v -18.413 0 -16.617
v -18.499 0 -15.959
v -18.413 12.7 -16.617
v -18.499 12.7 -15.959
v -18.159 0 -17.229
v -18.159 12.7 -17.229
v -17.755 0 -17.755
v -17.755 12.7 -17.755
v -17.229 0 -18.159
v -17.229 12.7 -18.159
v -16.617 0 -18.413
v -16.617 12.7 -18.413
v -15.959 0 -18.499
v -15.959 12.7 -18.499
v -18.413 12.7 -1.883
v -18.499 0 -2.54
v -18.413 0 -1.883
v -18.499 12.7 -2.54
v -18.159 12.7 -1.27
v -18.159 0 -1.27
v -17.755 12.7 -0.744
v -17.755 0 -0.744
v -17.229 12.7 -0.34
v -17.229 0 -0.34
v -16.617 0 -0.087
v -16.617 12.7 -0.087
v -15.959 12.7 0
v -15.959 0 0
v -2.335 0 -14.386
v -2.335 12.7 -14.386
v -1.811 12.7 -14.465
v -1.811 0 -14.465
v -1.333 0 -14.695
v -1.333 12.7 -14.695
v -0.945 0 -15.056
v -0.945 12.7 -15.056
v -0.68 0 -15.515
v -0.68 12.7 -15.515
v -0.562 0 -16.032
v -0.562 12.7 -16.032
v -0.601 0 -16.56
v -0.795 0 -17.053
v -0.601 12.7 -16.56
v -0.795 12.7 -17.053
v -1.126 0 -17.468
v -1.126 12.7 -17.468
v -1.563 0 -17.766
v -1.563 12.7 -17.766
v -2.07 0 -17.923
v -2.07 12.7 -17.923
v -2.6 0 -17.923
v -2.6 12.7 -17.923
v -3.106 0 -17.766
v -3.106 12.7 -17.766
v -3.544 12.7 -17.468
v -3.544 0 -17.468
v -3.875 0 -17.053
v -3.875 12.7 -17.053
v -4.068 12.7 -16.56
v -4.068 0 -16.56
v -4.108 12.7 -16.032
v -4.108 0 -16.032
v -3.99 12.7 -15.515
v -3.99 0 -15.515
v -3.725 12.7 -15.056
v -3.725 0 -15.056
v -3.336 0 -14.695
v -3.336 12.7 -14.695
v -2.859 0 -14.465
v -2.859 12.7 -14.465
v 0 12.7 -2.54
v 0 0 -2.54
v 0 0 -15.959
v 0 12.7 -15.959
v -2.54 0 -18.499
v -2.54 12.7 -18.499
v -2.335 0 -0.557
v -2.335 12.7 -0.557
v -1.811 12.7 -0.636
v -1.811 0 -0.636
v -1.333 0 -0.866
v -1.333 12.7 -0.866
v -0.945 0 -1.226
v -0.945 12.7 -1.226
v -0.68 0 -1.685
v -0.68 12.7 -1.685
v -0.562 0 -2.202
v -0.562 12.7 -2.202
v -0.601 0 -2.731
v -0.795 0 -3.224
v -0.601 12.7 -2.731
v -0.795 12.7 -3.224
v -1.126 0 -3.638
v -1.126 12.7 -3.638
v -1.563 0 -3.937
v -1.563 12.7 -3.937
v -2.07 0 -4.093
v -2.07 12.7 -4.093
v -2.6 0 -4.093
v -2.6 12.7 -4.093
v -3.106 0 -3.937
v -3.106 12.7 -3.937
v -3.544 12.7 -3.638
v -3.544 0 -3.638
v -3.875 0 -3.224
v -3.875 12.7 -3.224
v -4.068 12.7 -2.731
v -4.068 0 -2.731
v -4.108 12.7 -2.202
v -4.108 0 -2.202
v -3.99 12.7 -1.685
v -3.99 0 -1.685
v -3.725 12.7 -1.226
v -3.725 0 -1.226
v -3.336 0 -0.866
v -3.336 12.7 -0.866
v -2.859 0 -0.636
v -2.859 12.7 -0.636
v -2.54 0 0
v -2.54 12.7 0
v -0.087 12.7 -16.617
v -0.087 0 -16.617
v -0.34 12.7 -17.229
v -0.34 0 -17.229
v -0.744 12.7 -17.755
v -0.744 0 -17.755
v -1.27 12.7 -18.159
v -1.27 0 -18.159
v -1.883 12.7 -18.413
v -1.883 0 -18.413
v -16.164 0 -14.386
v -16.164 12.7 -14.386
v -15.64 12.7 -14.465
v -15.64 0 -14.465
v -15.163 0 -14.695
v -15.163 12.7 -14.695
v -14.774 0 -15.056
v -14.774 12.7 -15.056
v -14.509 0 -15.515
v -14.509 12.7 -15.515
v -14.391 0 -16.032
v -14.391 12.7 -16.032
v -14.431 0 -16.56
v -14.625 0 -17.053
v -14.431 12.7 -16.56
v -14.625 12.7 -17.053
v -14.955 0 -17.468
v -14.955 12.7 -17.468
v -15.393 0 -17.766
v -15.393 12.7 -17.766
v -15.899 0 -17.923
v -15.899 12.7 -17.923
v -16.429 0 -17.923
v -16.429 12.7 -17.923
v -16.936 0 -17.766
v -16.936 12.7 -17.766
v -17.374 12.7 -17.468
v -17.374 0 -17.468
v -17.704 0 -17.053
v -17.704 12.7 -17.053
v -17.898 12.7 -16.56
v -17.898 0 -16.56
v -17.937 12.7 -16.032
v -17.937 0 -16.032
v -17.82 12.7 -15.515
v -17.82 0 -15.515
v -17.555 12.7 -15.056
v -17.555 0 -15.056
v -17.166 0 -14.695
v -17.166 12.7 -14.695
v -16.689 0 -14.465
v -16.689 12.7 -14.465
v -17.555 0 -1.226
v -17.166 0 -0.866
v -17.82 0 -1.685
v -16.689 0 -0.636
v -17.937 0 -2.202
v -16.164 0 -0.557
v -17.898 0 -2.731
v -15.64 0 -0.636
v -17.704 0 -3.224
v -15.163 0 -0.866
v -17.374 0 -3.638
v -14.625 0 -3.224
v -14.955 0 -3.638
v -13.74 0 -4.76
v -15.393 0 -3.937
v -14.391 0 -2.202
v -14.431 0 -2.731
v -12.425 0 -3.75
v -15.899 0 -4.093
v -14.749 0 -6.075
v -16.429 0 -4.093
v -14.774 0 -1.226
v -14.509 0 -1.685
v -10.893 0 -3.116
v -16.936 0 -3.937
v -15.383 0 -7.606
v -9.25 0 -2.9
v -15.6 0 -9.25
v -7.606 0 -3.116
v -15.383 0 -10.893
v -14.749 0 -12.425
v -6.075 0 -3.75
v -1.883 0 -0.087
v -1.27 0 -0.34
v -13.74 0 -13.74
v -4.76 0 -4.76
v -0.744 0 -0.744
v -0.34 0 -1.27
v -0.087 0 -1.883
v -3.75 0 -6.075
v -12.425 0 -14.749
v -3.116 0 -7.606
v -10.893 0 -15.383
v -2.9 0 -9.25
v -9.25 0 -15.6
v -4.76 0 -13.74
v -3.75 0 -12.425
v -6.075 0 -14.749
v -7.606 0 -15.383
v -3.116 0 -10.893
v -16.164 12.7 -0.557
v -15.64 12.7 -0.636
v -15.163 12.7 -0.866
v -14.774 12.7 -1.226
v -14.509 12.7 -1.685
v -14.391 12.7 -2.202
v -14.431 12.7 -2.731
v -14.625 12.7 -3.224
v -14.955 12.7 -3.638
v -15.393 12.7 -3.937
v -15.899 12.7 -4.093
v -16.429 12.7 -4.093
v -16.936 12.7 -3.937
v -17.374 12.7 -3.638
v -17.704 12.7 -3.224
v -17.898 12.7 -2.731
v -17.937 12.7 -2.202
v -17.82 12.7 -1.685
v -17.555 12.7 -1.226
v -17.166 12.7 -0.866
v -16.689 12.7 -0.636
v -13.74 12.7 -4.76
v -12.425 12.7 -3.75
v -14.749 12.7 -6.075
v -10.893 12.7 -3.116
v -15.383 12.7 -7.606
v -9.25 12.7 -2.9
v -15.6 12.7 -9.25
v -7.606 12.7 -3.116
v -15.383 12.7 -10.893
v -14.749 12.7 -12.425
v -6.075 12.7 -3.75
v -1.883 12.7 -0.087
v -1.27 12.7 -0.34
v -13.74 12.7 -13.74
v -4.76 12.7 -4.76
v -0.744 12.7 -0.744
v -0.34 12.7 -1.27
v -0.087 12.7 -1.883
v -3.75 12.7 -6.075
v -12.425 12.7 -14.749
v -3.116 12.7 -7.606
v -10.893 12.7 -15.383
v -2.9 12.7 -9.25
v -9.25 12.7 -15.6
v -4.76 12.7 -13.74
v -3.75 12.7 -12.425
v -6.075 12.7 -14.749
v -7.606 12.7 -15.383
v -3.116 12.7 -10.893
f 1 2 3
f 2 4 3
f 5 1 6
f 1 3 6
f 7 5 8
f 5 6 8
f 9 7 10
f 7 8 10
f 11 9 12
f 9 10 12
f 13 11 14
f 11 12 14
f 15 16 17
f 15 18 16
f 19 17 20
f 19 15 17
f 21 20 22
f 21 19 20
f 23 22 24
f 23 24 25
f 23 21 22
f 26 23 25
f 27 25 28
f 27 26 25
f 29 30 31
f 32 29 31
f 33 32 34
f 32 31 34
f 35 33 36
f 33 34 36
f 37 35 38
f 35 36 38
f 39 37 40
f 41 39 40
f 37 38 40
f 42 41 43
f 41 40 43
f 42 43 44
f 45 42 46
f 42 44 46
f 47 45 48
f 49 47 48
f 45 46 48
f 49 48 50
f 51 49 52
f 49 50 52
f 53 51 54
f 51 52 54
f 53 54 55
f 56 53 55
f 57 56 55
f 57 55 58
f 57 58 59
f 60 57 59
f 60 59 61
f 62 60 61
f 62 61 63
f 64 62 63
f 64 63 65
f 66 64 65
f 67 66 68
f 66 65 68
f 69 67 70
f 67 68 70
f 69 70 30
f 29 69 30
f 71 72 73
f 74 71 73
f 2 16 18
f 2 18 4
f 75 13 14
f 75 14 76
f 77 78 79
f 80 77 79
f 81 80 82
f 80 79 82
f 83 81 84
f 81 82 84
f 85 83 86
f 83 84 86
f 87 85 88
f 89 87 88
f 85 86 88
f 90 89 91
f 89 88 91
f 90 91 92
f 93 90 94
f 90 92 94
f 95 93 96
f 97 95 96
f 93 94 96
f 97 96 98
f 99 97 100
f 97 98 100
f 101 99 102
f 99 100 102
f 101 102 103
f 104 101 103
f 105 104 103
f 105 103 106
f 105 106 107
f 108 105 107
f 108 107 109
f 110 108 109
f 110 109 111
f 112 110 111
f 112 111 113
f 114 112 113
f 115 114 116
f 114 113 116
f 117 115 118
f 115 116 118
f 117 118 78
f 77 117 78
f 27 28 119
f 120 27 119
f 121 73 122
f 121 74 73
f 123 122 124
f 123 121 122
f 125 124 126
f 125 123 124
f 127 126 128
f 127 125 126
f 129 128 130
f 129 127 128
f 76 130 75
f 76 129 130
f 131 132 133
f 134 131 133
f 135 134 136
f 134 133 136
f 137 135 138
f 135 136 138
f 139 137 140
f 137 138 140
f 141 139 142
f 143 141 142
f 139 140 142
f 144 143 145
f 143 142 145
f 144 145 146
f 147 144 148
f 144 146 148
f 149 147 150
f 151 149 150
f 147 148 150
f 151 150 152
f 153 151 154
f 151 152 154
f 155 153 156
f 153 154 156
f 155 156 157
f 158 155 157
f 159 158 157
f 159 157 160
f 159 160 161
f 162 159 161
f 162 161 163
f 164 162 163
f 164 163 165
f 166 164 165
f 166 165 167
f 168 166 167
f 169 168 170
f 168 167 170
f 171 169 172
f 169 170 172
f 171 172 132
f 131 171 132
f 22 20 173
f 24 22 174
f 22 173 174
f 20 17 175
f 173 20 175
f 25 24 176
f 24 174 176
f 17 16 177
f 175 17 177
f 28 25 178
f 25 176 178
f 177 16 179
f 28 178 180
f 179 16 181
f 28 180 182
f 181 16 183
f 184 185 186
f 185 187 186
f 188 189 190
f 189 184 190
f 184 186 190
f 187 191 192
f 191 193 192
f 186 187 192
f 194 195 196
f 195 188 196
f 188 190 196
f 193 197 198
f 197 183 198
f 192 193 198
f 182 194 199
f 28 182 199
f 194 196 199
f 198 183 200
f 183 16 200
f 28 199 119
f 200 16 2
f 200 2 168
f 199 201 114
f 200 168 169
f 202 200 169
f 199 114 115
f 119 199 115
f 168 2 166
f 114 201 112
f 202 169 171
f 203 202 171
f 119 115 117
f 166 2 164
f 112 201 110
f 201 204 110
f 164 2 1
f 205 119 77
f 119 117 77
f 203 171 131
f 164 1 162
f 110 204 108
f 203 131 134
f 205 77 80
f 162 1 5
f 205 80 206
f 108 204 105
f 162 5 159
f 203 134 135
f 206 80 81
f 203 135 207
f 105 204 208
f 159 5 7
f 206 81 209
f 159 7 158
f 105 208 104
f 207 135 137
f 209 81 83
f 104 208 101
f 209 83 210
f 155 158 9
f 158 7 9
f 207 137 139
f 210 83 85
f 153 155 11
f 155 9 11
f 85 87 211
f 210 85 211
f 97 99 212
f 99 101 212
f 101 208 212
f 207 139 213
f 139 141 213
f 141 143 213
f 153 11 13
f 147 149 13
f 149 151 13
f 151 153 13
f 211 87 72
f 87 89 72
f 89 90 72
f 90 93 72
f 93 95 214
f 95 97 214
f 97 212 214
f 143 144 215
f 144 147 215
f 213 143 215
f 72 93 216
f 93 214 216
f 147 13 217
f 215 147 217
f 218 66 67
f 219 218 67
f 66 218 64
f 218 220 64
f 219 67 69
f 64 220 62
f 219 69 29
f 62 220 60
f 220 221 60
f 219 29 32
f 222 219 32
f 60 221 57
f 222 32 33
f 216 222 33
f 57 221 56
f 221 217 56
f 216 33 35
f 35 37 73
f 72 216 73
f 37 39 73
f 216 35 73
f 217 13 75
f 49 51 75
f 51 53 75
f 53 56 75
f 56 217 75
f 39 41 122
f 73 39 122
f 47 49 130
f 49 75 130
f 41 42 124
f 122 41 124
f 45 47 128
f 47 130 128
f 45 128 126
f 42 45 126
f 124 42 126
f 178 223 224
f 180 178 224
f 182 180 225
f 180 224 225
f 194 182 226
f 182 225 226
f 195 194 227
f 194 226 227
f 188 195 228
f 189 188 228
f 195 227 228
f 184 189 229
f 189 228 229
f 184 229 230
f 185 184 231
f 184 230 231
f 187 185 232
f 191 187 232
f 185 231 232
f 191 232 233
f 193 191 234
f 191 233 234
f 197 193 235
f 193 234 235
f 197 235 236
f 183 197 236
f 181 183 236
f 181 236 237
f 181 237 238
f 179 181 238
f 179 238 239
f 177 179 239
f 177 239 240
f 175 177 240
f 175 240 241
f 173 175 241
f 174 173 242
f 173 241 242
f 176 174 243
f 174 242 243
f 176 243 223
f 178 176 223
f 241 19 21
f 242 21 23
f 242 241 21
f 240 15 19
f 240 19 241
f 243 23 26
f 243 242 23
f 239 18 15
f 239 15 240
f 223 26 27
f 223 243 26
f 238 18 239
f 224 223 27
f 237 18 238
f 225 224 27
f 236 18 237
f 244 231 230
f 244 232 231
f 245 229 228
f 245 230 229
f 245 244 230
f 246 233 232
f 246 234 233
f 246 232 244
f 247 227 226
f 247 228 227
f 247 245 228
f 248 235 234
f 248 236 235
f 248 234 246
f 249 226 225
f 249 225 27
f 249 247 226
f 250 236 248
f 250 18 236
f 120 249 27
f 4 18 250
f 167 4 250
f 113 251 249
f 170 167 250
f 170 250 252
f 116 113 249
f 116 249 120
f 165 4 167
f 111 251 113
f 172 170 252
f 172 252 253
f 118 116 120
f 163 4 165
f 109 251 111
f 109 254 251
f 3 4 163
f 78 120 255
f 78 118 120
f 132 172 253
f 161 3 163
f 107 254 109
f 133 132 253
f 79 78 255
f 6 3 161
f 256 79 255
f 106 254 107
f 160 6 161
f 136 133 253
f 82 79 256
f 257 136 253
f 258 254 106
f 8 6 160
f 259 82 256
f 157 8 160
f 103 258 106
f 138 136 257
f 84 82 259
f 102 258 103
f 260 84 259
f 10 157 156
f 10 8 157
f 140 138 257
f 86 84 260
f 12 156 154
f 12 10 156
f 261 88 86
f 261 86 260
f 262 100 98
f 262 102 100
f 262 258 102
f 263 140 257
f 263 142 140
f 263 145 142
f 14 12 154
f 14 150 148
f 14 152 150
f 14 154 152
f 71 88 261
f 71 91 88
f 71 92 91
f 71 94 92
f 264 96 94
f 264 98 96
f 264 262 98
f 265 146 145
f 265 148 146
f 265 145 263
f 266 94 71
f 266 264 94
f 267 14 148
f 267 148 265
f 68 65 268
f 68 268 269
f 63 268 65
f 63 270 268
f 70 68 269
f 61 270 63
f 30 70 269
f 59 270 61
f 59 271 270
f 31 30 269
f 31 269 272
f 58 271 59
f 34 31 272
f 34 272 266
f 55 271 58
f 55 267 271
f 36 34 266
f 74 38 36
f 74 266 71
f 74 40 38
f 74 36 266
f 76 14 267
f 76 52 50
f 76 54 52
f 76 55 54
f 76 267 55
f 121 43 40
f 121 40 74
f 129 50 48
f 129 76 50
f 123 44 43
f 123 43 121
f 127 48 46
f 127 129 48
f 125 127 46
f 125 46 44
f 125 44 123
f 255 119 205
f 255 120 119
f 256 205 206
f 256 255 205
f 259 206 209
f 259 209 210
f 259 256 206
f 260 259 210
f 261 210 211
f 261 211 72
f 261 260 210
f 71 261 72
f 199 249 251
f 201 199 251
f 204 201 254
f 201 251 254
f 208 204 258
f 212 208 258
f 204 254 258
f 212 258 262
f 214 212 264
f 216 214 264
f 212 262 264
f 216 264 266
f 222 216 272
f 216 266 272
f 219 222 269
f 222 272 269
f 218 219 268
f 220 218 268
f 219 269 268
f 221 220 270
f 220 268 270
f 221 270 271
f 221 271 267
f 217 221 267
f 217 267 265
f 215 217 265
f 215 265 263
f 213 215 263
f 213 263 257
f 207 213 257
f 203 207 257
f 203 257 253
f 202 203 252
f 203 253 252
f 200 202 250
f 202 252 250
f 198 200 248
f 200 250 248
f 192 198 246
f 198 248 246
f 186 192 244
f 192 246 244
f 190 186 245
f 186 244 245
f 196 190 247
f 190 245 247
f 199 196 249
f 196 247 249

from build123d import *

# Parameters (mm, degrees)
SKETCH3_W           = 18.499327609
SKETCH3_H           = 18.499327609
BOSS_EXTRUDE2_DEPTH = 12.7
FILLET2_R           = 2.54
SKETCH4_R           = 6.35
SKETCH4_R_2         = 1.778
CUT_EXTRUDE1_DEPTH  = 12.7


with BuildPart() as part:
    # Sketch3 → Boss-Extrude2 (new body)
    with BuildSketch(Plane(origin=(0, 0, 0), x_dir=(1, 0, 0), z_dir=(0, 1, 0))):
        with Locations((-9.249663805, 9.249663805)):
            Rectangle(SKETCH3_W, SKETCH3_H)
    extrude(amount=BOSS_EXTRUDE2_DEPTH)

    # Fillet2
    fillet2_edges = [part.edges().sort_by_distance(p)[0] for p in [
        (0, 6.35, 0),
        (-18.499327609, 6.35, 0),
        (-18.499327609, 6.35, -18.499327609),
        (0, 6.35, -18.499327609),
    ]]
    fillet(fillet2_edges, radius=FILLET2_R)

    # Sketch4 → Cut-Extrude1 (cut)
    with BuildSketch(Plane(origin=(0, 12.7, 0), x_dir=(1, 0, 0), z_dir=(0, 1, 0))):
        with Locations(Location((-9.249663805, 9.249663805, 0), (0, 0, 270))):
            Circle(SKETCH4_R)
        with Locations(Location((-2.334866591, 2.334866591, 0), (0, 0, 270))):
            Circle(SKETCH4_R_2)
        with Locations(Location((-16.164461018, 2.334866591, 0), (0, 0, 270))):
            Circle(SKETCH4_R_2)
        with Locations(Location((-16.164461018, 16.164461018, 0), (0, 0, 270))):
            Circle(SKETCH4_R_2)
        with Locations(Location((-2.334866591, 16.164461018, 0), (0, 0, 270))):
            Circle(SKETCH4_R_2)
    extrude(amount=-CUT_EXTRUDE1_DEPTH, mode=Mode.SUBTRACT)


solid = part.part
